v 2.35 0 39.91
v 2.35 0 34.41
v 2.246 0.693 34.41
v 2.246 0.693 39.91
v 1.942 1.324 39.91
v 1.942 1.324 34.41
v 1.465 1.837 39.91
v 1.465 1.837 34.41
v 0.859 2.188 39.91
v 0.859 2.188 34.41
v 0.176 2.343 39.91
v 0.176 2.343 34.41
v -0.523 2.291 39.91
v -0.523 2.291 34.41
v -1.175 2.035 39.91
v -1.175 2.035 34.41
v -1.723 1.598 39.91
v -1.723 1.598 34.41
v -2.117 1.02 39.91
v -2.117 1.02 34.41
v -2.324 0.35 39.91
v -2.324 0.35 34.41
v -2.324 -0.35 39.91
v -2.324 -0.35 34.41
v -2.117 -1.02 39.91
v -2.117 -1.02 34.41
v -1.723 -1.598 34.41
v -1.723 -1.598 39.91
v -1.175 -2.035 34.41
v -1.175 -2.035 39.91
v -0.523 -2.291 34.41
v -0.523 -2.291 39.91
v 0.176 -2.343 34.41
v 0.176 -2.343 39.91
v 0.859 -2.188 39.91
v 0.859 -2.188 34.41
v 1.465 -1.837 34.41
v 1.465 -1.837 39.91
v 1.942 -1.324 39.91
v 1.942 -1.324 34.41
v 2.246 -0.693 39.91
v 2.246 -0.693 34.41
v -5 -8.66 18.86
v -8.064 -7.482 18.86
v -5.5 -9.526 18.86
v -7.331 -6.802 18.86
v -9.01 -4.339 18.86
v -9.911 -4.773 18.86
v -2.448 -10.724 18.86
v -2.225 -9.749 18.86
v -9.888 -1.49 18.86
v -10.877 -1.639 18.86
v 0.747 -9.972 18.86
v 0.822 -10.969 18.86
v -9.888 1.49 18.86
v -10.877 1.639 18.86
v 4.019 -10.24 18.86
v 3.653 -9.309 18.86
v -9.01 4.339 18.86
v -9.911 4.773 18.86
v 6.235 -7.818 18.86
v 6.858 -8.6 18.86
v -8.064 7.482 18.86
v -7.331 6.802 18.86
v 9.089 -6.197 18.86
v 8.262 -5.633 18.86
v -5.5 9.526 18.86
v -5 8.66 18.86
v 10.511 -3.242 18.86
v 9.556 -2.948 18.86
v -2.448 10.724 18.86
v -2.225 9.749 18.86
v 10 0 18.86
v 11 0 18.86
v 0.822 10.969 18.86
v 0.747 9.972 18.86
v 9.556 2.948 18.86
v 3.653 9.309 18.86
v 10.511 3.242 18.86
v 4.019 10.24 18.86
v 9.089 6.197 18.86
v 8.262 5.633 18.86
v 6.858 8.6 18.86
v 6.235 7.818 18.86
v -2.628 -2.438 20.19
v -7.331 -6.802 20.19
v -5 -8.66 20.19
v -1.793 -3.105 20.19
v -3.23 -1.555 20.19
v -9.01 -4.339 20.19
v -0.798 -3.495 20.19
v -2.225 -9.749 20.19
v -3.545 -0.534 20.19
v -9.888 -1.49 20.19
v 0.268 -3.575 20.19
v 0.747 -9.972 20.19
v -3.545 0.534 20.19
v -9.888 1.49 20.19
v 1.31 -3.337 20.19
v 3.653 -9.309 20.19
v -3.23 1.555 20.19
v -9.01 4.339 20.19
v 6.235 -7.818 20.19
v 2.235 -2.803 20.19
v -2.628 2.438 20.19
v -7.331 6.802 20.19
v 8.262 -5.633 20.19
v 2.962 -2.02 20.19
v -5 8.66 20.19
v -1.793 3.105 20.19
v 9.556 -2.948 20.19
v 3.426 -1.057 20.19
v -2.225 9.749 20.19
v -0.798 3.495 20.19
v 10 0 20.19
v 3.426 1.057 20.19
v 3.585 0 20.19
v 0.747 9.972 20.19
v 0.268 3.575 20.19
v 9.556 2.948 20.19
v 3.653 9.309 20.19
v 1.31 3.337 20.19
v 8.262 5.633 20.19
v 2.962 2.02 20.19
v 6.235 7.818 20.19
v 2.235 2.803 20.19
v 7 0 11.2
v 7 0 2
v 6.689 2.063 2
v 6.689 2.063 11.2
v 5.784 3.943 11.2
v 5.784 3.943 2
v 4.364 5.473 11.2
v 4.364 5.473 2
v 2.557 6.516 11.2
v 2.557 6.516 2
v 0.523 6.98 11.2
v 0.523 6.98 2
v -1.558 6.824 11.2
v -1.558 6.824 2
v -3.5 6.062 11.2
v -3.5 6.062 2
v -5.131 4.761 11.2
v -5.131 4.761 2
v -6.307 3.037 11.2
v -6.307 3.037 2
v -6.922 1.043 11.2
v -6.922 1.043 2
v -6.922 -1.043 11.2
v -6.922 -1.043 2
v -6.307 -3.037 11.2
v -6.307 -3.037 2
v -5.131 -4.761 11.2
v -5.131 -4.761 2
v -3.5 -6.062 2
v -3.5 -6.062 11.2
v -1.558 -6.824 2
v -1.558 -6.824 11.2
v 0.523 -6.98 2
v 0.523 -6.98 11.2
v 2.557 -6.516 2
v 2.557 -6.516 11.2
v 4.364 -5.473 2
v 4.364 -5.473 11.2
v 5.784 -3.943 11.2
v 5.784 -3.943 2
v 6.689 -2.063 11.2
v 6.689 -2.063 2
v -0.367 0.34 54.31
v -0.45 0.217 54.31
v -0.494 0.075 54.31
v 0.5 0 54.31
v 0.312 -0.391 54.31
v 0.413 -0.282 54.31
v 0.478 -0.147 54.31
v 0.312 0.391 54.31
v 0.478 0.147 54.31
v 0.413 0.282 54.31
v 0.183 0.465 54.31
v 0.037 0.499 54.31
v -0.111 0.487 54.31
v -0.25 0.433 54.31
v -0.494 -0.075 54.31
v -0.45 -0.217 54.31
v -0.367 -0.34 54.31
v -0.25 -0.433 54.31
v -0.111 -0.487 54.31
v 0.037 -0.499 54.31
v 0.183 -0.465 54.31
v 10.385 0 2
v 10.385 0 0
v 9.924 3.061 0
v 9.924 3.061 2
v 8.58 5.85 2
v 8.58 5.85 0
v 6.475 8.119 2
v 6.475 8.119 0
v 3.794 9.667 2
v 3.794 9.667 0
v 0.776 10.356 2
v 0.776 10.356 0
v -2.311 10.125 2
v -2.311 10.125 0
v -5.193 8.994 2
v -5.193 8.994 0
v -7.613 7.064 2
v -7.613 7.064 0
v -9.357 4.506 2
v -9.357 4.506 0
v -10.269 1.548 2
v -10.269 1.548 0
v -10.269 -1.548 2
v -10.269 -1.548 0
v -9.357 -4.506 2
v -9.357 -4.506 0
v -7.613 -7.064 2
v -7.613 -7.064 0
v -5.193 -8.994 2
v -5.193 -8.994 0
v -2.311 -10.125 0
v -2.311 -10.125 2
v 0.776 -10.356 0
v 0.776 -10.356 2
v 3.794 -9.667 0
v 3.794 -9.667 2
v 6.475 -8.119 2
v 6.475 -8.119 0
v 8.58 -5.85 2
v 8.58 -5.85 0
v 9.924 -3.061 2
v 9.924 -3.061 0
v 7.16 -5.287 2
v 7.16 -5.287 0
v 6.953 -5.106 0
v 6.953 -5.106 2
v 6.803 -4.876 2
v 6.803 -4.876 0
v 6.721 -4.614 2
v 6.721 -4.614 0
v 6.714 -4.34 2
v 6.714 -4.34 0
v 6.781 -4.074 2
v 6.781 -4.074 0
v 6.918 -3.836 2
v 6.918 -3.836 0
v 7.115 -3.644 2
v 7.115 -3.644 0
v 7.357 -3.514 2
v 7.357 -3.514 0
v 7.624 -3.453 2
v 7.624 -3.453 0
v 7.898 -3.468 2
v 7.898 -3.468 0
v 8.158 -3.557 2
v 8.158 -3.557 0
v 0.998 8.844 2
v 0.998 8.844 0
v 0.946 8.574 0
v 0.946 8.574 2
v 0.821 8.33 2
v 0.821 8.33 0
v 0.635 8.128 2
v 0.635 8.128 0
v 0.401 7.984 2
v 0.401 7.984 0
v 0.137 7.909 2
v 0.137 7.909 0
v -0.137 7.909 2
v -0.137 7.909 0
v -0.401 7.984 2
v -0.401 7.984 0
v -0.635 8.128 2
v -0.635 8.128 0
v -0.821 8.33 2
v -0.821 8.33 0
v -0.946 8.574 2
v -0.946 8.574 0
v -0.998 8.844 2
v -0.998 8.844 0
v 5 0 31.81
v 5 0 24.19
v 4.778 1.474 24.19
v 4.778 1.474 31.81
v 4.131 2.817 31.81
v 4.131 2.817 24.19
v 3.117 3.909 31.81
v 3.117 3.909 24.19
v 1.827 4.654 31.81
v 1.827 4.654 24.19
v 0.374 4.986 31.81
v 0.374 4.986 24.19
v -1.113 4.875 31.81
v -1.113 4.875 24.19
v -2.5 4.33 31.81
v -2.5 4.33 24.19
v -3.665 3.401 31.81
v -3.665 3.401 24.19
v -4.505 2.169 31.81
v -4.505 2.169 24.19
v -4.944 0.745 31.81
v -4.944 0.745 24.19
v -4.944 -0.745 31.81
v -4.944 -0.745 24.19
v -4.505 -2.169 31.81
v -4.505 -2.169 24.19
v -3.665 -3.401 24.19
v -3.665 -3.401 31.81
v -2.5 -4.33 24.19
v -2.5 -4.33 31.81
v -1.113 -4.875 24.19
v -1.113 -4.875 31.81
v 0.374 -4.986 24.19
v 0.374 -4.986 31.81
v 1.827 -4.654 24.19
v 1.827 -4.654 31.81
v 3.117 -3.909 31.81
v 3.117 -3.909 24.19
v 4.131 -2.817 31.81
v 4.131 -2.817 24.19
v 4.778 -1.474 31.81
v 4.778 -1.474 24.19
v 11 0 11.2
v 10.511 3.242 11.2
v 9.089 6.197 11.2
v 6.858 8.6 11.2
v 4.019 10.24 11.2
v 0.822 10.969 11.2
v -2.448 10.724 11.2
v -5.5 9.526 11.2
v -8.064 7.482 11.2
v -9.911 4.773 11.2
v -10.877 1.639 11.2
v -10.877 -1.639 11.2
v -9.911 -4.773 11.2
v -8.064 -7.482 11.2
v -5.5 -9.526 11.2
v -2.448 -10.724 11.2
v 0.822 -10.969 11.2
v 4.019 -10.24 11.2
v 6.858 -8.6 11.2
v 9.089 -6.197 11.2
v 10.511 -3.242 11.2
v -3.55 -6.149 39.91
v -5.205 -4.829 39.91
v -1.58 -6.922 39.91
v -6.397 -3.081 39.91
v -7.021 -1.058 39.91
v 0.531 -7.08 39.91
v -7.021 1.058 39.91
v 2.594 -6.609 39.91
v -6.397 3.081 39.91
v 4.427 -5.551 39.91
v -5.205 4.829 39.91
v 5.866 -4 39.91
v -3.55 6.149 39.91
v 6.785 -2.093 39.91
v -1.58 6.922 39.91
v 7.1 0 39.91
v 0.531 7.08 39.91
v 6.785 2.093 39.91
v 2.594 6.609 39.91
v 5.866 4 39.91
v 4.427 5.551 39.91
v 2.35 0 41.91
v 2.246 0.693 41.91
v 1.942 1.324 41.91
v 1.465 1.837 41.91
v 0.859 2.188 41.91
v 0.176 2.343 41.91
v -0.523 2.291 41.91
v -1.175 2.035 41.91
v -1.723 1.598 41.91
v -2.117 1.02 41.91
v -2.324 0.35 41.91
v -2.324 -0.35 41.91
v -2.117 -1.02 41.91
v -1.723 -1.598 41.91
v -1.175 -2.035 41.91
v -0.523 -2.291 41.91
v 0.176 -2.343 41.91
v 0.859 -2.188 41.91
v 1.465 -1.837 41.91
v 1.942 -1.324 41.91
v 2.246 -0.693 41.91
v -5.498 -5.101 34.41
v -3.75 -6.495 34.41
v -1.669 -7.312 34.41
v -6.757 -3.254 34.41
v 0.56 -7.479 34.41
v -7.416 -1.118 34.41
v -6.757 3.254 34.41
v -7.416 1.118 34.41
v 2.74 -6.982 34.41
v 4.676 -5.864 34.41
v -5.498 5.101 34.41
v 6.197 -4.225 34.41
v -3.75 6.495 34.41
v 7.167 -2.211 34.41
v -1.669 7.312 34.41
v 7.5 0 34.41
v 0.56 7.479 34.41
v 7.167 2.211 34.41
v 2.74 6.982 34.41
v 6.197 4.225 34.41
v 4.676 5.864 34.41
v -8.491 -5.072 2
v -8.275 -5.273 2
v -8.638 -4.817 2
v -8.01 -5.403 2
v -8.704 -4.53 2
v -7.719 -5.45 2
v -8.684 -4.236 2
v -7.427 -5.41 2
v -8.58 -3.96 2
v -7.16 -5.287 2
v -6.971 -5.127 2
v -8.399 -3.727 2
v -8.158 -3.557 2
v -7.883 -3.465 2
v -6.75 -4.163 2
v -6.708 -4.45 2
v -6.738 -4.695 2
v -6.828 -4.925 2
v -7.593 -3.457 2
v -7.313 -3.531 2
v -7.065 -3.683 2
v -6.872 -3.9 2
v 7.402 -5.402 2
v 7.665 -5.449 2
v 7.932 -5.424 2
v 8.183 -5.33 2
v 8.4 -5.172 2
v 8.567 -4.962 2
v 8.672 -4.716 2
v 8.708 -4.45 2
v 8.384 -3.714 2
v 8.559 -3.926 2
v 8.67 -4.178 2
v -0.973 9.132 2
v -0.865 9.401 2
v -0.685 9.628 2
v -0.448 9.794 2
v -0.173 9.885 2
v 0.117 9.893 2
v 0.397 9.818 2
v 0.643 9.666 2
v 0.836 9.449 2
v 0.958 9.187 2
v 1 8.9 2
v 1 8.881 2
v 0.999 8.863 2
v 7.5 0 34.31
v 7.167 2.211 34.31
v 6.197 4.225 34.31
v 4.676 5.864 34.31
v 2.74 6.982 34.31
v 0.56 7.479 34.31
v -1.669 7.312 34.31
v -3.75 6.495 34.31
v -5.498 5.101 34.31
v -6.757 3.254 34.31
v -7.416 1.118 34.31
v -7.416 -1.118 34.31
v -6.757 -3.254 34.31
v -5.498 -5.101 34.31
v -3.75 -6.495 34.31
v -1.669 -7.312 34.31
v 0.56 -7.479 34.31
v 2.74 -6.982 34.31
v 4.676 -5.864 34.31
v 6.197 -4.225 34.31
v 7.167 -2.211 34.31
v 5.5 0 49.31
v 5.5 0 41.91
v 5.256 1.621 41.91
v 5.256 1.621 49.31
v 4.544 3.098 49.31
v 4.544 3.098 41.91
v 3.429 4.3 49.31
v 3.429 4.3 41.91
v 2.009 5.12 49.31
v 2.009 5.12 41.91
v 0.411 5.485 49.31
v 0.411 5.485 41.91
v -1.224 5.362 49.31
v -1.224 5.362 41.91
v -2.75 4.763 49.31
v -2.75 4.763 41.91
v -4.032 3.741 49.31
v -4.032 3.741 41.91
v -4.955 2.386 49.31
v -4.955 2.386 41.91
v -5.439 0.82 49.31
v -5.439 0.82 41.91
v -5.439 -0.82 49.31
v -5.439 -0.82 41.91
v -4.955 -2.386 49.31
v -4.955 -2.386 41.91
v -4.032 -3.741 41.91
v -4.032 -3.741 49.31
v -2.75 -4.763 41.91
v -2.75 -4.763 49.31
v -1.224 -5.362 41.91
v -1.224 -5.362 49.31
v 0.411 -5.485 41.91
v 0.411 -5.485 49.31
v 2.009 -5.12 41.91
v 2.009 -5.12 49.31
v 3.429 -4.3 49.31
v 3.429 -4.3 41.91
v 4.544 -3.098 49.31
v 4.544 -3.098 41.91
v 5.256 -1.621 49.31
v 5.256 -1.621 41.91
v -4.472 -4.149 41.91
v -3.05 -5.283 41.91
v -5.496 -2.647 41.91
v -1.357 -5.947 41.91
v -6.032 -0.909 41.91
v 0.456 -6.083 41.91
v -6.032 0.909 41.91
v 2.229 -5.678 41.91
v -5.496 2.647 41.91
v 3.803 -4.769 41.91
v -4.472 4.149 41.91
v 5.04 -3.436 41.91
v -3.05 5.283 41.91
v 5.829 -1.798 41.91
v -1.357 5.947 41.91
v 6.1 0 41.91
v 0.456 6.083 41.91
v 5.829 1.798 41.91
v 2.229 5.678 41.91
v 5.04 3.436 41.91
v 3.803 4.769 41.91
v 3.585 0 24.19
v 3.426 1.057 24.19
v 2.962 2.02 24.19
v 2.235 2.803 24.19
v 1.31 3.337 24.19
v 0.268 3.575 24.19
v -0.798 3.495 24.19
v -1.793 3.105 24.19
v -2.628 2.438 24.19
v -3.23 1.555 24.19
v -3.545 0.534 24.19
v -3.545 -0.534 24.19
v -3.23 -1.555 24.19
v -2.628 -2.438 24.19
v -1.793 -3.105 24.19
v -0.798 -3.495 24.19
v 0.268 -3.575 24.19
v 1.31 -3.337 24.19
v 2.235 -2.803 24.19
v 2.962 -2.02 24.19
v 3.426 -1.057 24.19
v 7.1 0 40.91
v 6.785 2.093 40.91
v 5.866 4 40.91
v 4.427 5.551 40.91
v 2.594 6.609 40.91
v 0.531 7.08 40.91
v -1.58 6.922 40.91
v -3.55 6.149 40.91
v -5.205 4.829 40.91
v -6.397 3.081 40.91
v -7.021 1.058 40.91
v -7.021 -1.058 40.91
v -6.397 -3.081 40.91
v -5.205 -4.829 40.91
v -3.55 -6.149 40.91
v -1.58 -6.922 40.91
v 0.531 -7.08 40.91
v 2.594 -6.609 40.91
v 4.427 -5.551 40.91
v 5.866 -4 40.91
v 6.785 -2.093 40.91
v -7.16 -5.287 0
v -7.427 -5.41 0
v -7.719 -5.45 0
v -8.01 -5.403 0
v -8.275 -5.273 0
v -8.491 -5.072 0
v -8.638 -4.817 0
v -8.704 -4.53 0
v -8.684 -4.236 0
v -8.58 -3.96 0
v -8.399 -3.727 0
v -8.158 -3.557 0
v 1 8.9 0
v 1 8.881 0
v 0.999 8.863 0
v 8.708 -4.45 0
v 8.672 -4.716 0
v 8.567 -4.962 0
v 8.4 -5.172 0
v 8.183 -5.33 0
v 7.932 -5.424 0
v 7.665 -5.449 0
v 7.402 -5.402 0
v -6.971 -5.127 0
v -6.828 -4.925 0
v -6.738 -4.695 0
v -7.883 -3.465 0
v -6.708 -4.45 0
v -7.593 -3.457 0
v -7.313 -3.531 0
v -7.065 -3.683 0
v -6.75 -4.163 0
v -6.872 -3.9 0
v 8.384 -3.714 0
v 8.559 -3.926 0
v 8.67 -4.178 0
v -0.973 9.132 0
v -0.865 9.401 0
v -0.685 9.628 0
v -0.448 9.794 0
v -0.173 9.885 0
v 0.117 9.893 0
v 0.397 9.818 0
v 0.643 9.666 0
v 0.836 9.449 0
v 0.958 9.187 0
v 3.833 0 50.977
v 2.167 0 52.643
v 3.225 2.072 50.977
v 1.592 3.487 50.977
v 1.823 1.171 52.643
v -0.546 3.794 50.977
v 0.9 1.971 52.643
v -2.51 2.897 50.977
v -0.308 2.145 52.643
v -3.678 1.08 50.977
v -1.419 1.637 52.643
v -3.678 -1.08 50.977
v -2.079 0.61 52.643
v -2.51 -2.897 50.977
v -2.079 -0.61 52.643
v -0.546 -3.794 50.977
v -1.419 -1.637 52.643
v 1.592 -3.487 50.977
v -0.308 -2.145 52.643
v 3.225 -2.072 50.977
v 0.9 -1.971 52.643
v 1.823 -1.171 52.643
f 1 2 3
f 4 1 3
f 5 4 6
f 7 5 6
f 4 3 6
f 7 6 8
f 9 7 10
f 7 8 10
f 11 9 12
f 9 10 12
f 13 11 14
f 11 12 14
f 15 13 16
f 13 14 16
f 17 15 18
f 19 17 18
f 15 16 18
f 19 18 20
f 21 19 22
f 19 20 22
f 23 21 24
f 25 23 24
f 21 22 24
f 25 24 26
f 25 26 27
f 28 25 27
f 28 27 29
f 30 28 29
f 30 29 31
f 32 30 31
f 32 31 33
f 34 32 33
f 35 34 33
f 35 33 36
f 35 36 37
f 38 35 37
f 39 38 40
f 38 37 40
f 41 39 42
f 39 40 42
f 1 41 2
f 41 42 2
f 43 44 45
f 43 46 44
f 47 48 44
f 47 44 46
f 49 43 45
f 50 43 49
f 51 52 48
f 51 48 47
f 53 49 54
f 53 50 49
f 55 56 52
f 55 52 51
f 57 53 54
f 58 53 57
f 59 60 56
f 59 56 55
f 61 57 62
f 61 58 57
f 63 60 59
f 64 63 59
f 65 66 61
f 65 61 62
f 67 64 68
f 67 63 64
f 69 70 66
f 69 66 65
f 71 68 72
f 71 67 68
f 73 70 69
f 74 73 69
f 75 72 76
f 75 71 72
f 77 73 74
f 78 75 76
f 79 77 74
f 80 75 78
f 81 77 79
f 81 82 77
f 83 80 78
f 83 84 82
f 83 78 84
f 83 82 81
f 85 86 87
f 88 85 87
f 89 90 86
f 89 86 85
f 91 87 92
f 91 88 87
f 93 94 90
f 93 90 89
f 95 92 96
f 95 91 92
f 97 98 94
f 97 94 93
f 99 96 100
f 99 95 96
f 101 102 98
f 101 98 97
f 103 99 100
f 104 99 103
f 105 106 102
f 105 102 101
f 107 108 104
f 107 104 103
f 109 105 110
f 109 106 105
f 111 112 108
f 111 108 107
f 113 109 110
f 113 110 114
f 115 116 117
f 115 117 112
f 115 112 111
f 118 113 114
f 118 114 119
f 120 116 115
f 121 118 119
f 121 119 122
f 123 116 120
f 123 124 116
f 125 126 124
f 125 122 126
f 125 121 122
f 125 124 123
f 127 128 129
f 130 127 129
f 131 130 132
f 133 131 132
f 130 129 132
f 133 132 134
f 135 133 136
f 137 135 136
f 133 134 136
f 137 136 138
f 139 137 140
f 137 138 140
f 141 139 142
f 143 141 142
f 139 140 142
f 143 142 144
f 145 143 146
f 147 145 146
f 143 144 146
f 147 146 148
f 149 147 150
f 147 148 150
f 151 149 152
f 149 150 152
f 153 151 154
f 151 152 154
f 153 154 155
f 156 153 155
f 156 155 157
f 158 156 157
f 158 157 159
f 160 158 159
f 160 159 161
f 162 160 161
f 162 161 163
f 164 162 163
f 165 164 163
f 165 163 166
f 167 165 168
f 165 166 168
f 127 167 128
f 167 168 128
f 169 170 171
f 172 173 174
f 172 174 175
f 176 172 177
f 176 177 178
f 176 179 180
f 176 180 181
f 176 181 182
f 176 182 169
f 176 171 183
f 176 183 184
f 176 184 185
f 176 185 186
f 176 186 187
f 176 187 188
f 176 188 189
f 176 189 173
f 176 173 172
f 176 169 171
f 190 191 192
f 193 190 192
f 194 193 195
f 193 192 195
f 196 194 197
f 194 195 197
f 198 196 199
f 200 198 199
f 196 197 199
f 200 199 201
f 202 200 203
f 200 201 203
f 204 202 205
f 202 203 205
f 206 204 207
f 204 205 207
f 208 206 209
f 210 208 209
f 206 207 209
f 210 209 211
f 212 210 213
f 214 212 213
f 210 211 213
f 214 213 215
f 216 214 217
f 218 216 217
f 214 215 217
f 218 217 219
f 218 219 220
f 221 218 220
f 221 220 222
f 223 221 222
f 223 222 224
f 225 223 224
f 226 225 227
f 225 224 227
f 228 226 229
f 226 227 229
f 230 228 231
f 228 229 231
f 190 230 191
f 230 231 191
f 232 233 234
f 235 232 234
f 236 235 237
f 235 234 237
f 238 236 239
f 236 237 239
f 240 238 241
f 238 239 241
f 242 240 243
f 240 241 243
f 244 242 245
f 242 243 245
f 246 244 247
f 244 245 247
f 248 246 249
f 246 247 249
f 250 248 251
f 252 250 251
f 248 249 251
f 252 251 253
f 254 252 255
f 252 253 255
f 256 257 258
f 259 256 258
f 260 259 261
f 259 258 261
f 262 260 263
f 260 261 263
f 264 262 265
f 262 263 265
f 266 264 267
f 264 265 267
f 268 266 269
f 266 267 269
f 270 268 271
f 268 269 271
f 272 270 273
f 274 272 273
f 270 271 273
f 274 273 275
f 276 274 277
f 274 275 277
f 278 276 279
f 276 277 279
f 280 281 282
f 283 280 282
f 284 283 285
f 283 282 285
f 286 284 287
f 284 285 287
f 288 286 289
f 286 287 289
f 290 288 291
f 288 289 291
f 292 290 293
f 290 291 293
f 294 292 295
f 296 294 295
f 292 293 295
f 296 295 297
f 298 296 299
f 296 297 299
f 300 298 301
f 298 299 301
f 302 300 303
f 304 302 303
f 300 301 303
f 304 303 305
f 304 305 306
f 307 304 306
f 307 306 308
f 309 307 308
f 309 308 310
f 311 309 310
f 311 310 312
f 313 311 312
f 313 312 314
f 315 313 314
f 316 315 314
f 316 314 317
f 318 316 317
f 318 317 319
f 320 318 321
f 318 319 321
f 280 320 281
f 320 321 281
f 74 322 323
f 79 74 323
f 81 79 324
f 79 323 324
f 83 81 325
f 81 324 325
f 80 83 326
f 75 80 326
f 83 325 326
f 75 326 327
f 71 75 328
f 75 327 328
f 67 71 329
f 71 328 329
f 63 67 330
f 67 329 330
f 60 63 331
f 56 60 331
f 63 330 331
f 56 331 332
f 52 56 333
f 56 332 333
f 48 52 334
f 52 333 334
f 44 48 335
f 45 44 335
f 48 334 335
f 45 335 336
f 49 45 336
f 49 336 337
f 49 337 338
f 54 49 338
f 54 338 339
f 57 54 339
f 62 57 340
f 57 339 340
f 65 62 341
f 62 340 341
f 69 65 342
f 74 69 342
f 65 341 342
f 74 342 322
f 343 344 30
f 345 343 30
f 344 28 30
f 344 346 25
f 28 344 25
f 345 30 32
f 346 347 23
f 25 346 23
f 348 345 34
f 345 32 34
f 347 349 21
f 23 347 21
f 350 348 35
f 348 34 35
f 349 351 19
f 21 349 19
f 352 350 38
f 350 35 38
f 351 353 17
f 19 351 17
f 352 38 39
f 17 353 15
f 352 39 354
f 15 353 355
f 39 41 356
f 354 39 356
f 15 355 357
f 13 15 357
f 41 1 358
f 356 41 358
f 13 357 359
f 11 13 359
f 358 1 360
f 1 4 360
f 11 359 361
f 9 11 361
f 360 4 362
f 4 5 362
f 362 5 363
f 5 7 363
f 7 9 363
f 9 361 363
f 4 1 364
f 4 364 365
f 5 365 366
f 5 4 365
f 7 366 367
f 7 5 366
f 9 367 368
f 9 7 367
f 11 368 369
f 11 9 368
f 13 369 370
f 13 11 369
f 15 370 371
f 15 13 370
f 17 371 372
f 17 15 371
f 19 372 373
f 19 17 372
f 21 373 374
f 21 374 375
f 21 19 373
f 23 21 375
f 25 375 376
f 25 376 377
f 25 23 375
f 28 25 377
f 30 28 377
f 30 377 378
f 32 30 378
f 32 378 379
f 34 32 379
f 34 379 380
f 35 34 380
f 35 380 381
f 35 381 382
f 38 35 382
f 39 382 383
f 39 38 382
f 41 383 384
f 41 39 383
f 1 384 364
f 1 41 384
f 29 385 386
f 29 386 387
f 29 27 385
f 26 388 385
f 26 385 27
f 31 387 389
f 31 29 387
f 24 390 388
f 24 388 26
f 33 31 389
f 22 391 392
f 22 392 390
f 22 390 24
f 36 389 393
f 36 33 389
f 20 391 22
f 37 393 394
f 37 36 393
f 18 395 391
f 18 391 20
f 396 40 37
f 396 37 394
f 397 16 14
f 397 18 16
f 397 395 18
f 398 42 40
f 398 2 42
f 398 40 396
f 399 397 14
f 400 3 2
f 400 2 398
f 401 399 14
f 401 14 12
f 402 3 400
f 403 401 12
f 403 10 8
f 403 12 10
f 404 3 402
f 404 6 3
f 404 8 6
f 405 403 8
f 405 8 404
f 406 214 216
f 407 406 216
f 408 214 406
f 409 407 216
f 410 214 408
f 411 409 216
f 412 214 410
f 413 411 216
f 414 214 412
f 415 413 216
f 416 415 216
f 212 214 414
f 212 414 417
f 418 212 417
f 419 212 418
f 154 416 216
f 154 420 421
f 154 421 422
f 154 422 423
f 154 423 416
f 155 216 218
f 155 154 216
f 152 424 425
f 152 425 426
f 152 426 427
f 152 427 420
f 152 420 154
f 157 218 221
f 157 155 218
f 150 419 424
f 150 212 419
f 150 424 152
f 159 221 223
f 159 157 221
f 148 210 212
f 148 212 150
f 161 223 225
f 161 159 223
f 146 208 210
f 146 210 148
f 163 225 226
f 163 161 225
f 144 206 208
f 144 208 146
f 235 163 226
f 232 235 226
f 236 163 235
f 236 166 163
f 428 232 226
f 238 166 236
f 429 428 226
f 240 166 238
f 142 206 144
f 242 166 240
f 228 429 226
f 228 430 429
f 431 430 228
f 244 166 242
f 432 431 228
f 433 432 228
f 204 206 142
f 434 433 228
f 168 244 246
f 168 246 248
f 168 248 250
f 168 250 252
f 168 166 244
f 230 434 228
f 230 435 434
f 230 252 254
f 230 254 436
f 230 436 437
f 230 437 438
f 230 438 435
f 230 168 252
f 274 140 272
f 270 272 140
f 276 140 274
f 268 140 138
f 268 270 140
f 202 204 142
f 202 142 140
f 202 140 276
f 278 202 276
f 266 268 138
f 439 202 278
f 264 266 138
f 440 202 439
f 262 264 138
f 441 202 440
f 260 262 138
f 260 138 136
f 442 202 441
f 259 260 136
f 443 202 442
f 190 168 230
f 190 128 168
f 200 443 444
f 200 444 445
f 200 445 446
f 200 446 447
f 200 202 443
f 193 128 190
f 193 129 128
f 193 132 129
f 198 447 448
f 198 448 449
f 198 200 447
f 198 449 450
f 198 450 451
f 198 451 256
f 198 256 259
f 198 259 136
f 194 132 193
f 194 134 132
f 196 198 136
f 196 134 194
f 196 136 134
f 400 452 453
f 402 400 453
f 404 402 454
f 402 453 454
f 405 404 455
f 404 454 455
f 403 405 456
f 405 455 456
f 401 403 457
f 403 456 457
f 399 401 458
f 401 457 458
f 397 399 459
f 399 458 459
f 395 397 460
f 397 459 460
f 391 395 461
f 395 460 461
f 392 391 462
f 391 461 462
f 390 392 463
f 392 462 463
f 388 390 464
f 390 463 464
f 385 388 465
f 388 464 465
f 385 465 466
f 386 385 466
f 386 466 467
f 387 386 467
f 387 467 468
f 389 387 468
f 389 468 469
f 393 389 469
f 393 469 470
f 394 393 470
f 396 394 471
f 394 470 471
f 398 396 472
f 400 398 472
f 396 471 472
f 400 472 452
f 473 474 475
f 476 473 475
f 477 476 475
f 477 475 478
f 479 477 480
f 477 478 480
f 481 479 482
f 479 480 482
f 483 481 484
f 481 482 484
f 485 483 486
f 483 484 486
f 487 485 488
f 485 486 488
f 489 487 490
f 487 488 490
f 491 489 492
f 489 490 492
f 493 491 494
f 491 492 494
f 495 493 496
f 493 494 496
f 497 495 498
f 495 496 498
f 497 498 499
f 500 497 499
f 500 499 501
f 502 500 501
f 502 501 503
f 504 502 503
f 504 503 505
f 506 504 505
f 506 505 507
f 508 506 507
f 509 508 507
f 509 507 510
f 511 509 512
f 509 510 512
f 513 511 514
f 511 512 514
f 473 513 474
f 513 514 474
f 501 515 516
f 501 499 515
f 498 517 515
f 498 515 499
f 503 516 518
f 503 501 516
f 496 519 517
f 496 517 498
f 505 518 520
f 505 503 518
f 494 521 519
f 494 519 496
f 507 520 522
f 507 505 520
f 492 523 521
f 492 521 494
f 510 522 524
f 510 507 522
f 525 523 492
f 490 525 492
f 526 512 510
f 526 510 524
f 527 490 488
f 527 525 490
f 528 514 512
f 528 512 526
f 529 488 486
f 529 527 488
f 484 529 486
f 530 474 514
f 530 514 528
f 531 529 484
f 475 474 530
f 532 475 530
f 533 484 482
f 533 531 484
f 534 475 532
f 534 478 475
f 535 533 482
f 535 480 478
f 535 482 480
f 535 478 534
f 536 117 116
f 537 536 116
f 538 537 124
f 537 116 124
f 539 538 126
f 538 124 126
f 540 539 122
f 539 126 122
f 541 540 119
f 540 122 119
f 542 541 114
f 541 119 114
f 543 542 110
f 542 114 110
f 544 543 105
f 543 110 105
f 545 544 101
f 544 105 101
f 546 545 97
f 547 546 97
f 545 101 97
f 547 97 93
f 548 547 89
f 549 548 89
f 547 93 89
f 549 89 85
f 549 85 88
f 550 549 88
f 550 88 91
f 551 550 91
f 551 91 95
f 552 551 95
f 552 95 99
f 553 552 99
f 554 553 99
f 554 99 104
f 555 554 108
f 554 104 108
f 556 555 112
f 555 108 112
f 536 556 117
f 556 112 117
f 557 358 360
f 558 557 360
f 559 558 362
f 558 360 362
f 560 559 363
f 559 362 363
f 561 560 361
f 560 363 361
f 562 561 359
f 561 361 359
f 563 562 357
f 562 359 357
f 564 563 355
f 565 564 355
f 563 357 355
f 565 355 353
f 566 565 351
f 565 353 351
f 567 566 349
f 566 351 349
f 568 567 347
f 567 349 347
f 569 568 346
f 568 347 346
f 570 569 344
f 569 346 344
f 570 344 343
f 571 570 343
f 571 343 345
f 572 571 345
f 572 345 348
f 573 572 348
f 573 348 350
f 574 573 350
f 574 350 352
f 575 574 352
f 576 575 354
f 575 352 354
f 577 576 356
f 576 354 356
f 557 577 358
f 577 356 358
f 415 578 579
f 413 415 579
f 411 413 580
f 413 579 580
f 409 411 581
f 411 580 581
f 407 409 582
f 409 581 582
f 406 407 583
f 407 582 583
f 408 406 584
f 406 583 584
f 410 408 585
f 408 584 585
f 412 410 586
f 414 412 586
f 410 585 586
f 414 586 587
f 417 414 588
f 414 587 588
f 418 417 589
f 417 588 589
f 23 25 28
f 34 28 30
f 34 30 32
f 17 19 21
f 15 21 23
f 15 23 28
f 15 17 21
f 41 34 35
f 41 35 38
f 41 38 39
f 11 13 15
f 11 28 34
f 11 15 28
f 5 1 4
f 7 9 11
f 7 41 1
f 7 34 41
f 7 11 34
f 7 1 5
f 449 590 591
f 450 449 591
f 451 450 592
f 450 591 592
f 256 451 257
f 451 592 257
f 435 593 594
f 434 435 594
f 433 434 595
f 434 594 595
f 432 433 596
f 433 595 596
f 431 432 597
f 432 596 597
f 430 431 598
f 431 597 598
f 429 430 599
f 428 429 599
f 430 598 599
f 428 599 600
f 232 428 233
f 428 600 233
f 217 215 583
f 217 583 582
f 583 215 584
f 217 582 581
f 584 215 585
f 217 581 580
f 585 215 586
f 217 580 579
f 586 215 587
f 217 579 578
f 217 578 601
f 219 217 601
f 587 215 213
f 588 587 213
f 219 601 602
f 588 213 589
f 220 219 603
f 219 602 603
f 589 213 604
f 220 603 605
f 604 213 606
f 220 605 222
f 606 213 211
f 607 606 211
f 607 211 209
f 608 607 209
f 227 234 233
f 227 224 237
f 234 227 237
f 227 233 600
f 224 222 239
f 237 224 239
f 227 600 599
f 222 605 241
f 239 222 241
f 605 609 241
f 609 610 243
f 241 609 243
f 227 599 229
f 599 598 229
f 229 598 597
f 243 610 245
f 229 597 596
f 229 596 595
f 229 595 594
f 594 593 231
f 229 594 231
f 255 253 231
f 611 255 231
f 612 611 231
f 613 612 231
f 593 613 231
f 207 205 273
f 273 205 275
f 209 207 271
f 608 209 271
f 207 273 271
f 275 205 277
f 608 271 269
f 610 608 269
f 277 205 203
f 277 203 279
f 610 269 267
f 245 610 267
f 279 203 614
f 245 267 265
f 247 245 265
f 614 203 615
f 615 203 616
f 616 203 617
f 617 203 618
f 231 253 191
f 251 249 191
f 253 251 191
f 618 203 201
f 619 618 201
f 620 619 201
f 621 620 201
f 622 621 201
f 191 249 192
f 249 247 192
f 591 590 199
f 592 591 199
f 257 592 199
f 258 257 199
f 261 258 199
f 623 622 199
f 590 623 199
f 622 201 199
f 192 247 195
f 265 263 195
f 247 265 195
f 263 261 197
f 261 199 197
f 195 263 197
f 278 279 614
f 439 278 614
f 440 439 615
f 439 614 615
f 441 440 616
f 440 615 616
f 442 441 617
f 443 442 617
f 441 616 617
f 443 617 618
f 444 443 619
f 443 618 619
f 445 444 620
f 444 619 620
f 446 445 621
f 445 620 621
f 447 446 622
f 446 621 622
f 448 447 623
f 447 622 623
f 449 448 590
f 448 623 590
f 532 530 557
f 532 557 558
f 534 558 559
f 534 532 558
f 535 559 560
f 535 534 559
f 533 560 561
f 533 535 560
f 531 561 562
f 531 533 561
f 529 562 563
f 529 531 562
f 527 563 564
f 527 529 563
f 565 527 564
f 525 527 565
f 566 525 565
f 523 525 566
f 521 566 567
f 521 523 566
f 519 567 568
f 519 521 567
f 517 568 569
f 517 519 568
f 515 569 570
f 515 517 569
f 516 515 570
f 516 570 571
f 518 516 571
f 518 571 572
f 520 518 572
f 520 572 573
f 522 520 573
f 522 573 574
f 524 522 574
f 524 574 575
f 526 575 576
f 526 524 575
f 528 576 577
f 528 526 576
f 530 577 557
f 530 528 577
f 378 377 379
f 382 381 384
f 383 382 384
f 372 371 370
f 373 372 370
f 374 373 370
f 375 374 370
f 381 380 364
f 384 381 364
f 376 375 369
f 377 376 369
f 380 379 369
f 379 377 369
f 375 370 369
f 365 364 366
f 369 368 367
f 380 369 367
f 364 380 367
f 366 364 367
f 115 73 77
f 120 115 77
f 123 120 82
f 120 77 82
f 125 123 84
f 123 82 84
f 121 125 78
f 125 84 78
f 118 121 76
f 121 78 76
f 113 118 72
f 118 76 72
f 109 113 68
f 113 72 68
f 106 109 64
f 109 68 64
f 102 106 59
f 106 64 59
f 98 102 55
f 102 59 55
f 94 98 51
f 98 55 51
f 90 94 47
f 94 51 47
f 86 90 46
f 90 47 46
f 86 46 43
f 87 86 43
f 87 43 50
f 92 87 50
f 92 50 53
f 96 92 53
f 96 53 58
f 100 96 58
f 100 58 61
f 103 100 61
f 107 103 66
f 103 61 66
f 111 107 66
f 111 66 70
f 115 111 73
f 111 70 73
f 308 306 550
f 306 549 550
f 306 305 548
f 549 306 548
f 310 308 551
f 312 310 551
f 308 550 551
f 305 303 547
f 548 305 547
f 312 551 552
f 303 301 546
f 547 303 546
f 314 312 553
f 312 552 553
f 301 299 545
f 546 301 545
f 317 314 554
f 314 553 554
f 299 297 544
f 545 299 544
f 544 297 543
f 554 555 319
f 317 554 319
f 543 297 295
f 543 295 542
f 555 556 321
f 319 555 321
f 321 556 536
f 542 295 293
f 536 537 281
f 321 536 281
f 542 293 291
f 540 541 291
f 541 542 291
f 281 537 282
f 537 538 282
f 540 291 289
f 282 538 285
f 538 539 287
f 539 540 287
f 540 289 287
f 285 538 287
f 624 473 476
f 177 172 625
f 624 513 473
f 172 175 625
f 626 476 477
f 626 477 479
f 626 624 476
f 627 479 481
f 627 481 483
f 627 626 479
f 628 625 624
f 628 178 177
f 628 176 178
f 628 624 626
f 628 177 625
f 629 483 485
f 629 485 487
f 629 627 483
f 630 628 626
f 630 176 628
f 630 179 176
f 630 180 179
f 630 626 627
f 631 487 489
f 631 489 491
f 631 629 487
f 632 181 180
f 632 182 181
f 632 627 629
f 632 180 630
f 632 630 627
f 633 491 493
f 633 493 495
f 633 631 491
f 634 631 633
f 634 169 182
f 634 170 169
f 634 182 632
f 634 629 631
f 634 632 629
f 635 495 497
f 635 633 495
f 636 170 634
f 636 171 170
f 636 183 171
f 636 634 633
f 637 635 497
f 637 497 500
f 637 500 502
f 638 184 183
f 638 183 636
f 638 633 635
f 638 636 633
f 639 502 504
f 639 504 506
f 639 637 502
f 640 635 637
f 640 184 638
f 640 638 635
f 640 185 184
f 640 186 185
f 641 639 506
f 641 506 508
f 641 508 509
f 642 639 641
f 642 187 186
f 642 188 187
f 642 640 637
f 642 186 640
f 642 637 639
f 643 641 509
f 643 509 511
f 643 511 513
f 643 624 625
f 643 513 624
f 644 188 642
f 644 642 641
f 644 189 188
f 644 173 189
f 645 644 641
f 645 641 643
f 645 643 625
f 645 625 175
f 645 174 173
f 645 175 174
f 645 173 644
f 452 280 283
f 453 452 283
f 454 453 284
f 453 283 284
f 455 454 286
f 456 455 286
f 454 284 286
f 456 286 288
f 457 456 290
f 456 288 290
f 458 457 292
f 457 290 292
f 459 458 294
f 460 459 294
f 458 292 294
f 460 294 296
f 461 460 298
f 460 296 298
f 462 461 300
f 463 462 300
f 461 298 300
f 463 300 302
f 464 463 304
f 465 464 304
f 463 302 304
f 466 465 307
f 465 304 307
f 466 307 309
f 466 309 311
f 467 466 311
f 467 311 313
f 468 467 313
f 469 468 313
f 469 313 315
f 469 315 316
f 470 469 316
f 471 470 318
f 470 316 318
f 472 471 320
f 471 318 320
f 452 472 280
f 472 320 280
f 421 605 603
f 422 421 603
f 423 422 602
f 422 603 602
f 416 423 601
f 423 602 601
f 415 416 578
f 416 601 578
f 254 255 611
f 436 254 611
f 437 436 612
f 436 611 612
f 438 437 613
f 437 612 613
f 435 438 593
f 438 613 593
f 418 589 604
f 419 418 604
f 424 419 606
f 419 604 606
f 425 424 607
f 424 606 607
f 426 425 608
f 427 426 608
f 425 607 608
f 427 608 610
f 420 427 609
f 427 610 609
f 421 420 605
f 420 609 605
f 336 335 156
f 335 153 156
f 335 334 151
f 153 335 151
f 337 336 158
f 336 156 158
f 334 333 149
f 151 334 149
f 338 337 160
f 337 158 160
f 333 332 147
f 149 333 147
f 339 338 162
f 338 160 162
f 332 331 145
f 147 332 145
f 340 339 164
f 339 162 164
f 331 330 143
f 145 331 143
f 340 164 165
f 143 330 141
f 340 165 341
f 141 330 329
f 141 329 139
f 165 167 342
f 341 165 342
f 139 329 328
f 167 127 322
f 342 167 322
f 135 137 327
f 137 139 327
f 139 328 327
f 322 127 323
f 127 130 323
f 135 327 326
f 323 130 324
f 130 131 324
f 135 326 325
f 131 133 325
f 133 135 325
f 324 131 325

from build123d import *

# Parameters (mm, degrees)
F0_R      = 10.385
F1_DEPTH  = 2
F2_R      = 7
F3_DEPTH  = 9.2
F4_R      = 11
F4_R_2    = 7
F5_DEPTH  = 7.66
F6_R      = 10
F7_DEPTH  = 1.33
F8_R      = 3.585
F9_DEPTH  = 4
F10_R     = 5
F11_DEPTH = 7.62
F12_R     = 7.5
F13_DEPTH = 2.6
F14_SIZE  = 2.49999
F15_R     = 2.35
F16_DEPTH = 5.5
F17_R     = 7.1
F17_R_2   = 2.35
F18_DEPTH = 2
F19_SIZE  = 1
F20_R     = 5.5
F21_DEPTH = 12.4
F22_SIZE  = 5


# Not quite as in the source:
# - a fillet or chamfer is up to 0.001 mm smaller than in the source, because OpenCascade refuses the exact size


with BuildPart() as f1:
    # F0 (on Top) → F1 (new body)
    with BuildSketch(Plane.XY):
        Circle(F0_R)
        with BuildLine():
            ThreePointArc((0.9984206693, 8.8438202247), (6.6368646196, 5.9297578384), (8.9, 0))
            ThreePointArc((8.9, 0), (8.7125722812, -1.8168886165), (8.1581833158, -3.5572524491))
            ThreePointArc((8.1581833158, -3.5572524491), (8.5592590023, -3.9258612884), (8.7076260937, -4.45))
            ThreePointArc((8.7076260937, -4.45), (8.1830924715, -5.3297338936), (7.1597626465, -5.2865677756))
            ThreePointArc((7.1597626465, -5.2865677756), (0, -8.9), (-7.1597626465, -5.2865677756))
            ThreePointArc((-7.1597626465, -5.2865677756), (-8.5736514975, -4.95), (-8.1581833158, -3.5572524491))
            ThreePointArc((-8.1581833158, -3.5572524491), (-7.7076260937, 4.45), (-0.9984206693, 8.8438202247))
            ThreePointArc((-0.9984206693, 8.8438202247), (-0.028100985, 9.8996050893), (1, 8.9))
            ThreePointArc((1, 8.9), (0.9996050893, 8.871899015), (0.9984206693, 8.8438202247))
        make_face(mode=Mode.SUBTRACT)
        with BuildLine():
            ThreePointArc((8.1581833158, -3.5572524491), (8.7125722812, -1.8168886165), (8.9, 0))
            ThreePointArc((8.9, 0), (6.6368646196, 5.9297578384), (0.9984206693, 8.8438202247))
            ThreePointArc((0.9984206693, 8.8438202247), (0, 7.9), (-0.9984206693, 8.8438202247))
            ThreePointArc((-0.9984206693, 8.8438202247), (-7.7076260937, 4.45), (-8.1581833158, -3.5572524491))
            ThreePointArc((-8.1581833158, -3.5572524491), (-7.1834873821, -3.5983670914), (-6.7076260937, -4.45))
            ThreePointArc((-6.7076260937, -4.45), (-6.8278922, -4.9254663778), (-7.1597626465, -5.2865677756))
            ThreePointArc((-7.1597626465, -5.2865677756), (0, -8.9), (7.1597626465, -5.2865677756))
            ThreePointArc((7.1597626465, -5.2865677756), (6.8416006899, -3.95), (8.1581833158, -3.5572524491))
        make_face()
    extrude(amount=F1_DEPTH)

    # F2 (on face) → F3 (join)
    with BuildSketch(Plane.XY.offset(2)):
        Circle(F2_R)
    extrude(amount=F3_DEPTH)

    # F4 (on face) → F5 (join)
    with BuildSketch(Plane.XY.offset(11.2)):
        Circle(F4_R)
        Circle(F4_R_2, mode=Mode.SUBTRACT)
        Circle(F4_R_2)
    extrude(amount=F5_DEPTH)

    # F6 (on face) → F7 (join)
    with BuildSketch(Plane.XY.offset(18.86)):
        Circle(F6_R)
    extrude(amount=F7_DEPTH)

    # F8 (on face) → F9 (join)
    with BuildSketch(Plane.XY.offset(20.19)):
        Circle(F8_R)
    extrude(amount=F9_DEPTH)

    # F10 (on face) → F11 (join)
    with BuildSketch(Plane.XY.offset(24.19)):
        Circle(F10_R)
    extrude(amount=F11_DEPTH)

    # F12 (on face) → F13 (join)
    with BuildSketch(Plane.XY.offset(31.81)):
        Circle(F12_R)
    extrude(amount=F13_DEPTH)

    # F14 (size 2.5 in the source; OpenCascade refuses exactly that, so slightly less here)
    f14_edges = [f1.edges().sort_by_distance(p)[0] for p in [
        (-7.5, 0, 31.81),
    ]]
    chamfer(f14_edges, length=F14_SIZE)

    # F15 (on face) → F16 (join)
    with BuildSketch(Plane.XY.offset(34.41)):
        Circle(F15_R)
    extrude(amount=F16_DEPTH)


with BuildPart() as f18:
    # F17 (on face) → F18 (new body)
    with BuildSketch(Plane.XY.offset(39.91)):
        Circle(F17_R)
        Circle(F17_R_2, mode=Mode.SUBTRACT)
    extrude(amount=F18_DEPTH)

    # F19
    f19_edges = [f18.edges().sort_by_distance(p)[0] for p in [
        (-7.1, 0, 41.91),
    ]]
    chamfer(f19_edges, length=F19_SIZE)

    # F20 (on face) → F21 (join)
    with BuildSketch(Plane.XY.offset(41.91)):
        Circle(F20_R)
    extrude(amount=F21_DEPTH)

    # F22
    f22_edges = [f18.edges().sort_by_distance(p)[0] for p in [
        (-5.5, 0, 54.31),
    ]]
    chamfer(f22_edges, length=F22_SIZE)


solid = Compound([f1.part, f18.part])
